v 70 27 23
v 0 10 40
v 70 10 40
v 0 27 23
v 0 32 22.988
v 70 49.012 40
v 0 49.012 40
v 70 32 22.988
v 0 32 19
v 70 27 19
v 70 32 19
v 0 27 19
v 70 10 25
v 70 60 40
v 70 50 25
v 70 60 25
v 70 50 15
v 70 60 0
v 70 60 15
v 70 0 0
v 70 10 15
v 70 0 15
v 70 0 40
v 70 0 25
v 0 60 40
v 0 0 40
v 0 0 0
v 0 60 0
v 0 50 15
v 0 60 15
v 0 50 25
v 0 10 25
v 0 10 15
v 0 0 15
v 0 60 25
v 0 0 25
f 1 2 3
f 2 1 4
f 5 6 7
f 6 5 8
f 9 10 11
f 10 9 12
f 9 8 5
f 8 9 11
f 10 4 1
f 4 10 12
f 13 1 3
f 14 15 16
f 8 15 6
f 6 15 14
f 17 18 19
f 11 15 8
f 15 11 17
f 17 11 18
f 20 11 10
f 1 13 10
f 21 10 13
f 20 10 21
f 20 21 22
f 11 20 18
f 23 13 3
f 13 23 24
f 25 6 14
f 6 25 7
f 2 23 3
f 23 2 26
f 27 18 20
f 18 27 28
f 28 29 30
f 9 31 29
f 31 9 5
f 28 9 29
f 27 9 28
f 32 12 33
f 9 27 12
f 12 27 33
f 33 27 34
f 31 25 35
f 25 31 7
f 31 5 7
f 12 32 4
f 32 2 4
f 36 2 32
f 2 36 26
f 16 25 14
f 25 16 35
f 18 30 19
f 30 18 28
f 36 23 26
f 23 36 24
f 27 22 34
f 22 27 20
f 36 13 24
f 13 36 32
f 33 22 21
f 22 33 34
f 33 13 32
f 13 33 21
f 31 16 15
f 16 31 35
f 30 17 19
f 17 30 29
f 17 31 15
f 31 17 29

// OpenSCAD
//prism module
module prism(l, w, h){
       polyhedron(
               points=[[0,0,0], [l,0,0], [l,w,0], [0,w,0], [0,w,h], [l,w,h]],
               faces=[[0,1,2,3],[5,4,3,2],[0,4,5,1],[0,3,4],[5,2,1]]
               );
           }

color("Silver")
difference()
{
 //Main block   
 cube([70,60,40]);

  translate([-1,9,41])
  //V cutout
   union()
      { 
         rotate([-45,0,0])
         prism(72,29,29);
         
        translate([0,18,-22])
         cube([72,5,5]);
       }
    //Square Block cut out1
    translate([-1,-1,15])
    cube([72,11,10]);
    //Square Block cut out2
    translate([-1,50,15])
    cube([72,11,10]);
 
}
